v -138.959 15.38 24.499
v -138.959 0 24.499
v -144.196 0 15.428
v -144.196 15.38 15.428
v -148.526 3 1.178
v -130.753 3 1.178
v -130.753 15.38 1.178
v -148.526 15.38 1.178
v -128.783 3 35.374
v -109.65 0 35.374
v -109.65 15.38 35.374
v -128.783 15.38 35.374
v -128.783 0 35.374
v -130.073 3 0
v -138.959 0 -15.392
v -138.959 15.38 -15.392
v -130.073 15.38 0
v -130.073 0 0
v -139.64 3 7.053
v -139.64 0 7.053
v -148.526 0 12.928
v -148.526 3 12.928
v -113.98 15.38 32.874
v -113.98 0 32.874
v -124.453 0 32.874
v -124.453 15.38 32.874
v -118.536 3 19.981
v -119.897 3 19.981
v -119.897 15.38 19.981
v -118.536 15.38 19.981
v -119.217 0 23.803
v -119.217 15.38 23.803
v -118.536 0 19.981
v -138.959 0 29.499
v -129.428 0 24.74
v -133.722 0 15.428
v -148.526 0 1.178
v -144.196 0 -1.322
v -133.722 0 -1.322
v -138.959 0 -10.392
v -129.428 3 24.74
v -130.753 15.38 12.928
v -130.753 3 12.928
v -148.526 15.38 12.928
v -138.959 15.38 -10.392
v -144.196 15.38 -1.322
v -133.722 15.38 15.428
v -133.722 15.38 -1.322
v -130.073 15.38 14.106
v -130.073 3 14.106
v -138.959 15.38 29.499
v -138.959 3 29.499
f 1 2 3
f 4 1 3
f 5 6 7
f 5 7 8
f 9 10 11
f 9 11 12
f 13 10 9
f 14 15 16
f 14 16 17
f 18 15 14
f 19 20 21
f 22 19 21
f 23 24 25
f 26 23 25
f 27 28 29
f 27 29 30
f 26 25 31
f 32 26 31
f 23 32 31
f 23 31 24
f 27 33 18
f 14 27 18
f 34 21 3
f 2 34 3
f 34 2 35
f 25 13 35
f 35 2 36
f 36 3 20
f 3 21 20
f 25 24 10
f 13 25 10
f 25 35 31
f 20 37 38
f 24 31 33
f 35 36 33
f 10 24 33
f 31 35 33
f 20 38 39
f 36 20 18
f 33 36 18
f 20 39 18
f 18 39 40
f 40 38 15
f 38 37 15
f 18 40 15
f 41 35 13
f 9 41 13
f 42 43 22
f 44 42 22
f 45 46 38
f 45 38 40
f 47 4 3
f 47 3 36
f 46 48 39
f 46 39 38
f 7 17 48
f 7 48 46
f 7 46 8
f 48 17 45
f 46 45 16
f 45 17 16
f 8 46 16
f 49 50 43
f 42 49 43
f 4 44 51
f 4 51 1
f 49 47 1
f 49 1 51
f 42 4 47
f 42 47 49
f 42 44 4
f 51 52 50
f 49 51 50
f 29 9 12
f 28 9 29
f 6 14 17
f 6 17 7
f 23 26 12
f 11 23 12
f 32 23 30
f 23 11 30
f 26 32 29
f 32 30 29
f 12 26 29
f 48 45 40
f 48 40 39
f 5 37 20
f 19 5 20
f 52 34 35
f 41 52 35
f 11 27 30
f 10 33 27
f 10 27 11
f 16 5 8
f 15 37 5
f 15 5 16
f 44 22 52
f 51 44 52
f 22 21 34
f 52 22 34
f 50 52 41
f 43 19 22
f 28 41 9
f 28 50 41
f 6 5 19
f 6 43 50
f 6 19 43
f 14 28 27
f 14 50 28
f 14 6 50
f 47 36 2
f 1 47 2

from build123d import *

# Parameters (mm, degrees)
BOSS_EXTRUDE3_DEPTH   = 15.38
BOSS_EXTRUDE3_2_DEPTH = 15.38
BOSS_EXTRUDE3_3_DEPTH = 15.38
BOSS_EXTRUDE5_DEPTH   = 3


with BuildPart() as part:
    # Sketch1 → Boss-Extrude3 (new body)
    with BuildSketch(Plane(origin=(0, 0, 0), x_dir=(1, 0, 0), z_dir=(0, 1, 0))):
        Polygon((-138.959292143, 15.392304845), (-130.072540797, 0), (-130.752776749, -1.17820323), (-148.526279441, -1.17820323), align=None)
        Polygon((-144.196152422, 1.32179677), (-133.722431864, 1.32179677), (-138.959292143, 10.392304845), align=None, mode=Mode.SUBTRACT)
    extrude(amount=BOSS_EXTRUDE3_DEPTH)



with BuildPart() as body_2:
    # Sketch1 → Boss-Extrude3 2 (new body)
    with BuildSketch(Plane(origin=(0, 0, 0), x_dir=(1, 0, 0), z_dir=(0, 1, 0))):
        Polygon((-130.752776749, -12.92820323), (-130.072540797, -14.106406459), (-138.959292143, -29.498711305), (-148.526279441, -12.92820323), align=None)
        Polygon((-144.196152422, -15.42820323), (-138.959292143, -24.498711305), (-133.722431864, -15.42820323), align=None, mode=Mode.SUBTRACT)
    extrude(amount=BOSS_EXTRUDE3_2_DEPTH)


with BuildPart() as body_3:
    # Sketch1 → Boss-Extrude3 3 (new body)
    with BuildSketch(Plane(origin=(0, 0, 0), x_dir=(1, 0, 0), z_dir=(0, 1, 0))):
        Polygon((-128.783493648, -35.373711305), (-119.896742302, -19.981406459), (-118.536270399, -19.981406459), (-109.649519053, -35.373711305), align=None)
        Polygon((-113.979646072, -32.873711305), (-119.216506351, -23.80320323), (-124.453366629, -32.873711305), align=None, mode=Mode.SUBTRACT)
    extrude(amount=BOSS_EXTRUDE3_3_DEPTH)


with BuildPart() as part_1:
    add(part.part)

    add(body_2.part)  # Boss-Extrude5 merges body 2

    add(body_3.part)  # Boss-Extrude5 merges body 3
    # Sketch1<7> → Boss-Extrude5 (add)
    with BuildSketch(Plane(origin=(0, 0, 0), x_dir=(1, 0, 0), z_dir=(0, 1, 0))):
        Polygon((-118.536270399, -19.981406459), (-130.072540797, 0), (-130.752776749, -1.17820323), (-148.526279441, -1.17820323), (-139.639528095, -7.05320323), (-148.526279441, -12.92820323), (-130.752776749, -12.92820323), (-130.072540797, -14.106406459), (-138.959292143, -29.498711305), (-129.428017223, -24.740058882), (-128.783493648, -35.373711305), (-119.896742302, -19.981406459), align=None)
    extrude(amount=BOSS_EXTRUDE5_DEPTH)


solid = part_1.part
